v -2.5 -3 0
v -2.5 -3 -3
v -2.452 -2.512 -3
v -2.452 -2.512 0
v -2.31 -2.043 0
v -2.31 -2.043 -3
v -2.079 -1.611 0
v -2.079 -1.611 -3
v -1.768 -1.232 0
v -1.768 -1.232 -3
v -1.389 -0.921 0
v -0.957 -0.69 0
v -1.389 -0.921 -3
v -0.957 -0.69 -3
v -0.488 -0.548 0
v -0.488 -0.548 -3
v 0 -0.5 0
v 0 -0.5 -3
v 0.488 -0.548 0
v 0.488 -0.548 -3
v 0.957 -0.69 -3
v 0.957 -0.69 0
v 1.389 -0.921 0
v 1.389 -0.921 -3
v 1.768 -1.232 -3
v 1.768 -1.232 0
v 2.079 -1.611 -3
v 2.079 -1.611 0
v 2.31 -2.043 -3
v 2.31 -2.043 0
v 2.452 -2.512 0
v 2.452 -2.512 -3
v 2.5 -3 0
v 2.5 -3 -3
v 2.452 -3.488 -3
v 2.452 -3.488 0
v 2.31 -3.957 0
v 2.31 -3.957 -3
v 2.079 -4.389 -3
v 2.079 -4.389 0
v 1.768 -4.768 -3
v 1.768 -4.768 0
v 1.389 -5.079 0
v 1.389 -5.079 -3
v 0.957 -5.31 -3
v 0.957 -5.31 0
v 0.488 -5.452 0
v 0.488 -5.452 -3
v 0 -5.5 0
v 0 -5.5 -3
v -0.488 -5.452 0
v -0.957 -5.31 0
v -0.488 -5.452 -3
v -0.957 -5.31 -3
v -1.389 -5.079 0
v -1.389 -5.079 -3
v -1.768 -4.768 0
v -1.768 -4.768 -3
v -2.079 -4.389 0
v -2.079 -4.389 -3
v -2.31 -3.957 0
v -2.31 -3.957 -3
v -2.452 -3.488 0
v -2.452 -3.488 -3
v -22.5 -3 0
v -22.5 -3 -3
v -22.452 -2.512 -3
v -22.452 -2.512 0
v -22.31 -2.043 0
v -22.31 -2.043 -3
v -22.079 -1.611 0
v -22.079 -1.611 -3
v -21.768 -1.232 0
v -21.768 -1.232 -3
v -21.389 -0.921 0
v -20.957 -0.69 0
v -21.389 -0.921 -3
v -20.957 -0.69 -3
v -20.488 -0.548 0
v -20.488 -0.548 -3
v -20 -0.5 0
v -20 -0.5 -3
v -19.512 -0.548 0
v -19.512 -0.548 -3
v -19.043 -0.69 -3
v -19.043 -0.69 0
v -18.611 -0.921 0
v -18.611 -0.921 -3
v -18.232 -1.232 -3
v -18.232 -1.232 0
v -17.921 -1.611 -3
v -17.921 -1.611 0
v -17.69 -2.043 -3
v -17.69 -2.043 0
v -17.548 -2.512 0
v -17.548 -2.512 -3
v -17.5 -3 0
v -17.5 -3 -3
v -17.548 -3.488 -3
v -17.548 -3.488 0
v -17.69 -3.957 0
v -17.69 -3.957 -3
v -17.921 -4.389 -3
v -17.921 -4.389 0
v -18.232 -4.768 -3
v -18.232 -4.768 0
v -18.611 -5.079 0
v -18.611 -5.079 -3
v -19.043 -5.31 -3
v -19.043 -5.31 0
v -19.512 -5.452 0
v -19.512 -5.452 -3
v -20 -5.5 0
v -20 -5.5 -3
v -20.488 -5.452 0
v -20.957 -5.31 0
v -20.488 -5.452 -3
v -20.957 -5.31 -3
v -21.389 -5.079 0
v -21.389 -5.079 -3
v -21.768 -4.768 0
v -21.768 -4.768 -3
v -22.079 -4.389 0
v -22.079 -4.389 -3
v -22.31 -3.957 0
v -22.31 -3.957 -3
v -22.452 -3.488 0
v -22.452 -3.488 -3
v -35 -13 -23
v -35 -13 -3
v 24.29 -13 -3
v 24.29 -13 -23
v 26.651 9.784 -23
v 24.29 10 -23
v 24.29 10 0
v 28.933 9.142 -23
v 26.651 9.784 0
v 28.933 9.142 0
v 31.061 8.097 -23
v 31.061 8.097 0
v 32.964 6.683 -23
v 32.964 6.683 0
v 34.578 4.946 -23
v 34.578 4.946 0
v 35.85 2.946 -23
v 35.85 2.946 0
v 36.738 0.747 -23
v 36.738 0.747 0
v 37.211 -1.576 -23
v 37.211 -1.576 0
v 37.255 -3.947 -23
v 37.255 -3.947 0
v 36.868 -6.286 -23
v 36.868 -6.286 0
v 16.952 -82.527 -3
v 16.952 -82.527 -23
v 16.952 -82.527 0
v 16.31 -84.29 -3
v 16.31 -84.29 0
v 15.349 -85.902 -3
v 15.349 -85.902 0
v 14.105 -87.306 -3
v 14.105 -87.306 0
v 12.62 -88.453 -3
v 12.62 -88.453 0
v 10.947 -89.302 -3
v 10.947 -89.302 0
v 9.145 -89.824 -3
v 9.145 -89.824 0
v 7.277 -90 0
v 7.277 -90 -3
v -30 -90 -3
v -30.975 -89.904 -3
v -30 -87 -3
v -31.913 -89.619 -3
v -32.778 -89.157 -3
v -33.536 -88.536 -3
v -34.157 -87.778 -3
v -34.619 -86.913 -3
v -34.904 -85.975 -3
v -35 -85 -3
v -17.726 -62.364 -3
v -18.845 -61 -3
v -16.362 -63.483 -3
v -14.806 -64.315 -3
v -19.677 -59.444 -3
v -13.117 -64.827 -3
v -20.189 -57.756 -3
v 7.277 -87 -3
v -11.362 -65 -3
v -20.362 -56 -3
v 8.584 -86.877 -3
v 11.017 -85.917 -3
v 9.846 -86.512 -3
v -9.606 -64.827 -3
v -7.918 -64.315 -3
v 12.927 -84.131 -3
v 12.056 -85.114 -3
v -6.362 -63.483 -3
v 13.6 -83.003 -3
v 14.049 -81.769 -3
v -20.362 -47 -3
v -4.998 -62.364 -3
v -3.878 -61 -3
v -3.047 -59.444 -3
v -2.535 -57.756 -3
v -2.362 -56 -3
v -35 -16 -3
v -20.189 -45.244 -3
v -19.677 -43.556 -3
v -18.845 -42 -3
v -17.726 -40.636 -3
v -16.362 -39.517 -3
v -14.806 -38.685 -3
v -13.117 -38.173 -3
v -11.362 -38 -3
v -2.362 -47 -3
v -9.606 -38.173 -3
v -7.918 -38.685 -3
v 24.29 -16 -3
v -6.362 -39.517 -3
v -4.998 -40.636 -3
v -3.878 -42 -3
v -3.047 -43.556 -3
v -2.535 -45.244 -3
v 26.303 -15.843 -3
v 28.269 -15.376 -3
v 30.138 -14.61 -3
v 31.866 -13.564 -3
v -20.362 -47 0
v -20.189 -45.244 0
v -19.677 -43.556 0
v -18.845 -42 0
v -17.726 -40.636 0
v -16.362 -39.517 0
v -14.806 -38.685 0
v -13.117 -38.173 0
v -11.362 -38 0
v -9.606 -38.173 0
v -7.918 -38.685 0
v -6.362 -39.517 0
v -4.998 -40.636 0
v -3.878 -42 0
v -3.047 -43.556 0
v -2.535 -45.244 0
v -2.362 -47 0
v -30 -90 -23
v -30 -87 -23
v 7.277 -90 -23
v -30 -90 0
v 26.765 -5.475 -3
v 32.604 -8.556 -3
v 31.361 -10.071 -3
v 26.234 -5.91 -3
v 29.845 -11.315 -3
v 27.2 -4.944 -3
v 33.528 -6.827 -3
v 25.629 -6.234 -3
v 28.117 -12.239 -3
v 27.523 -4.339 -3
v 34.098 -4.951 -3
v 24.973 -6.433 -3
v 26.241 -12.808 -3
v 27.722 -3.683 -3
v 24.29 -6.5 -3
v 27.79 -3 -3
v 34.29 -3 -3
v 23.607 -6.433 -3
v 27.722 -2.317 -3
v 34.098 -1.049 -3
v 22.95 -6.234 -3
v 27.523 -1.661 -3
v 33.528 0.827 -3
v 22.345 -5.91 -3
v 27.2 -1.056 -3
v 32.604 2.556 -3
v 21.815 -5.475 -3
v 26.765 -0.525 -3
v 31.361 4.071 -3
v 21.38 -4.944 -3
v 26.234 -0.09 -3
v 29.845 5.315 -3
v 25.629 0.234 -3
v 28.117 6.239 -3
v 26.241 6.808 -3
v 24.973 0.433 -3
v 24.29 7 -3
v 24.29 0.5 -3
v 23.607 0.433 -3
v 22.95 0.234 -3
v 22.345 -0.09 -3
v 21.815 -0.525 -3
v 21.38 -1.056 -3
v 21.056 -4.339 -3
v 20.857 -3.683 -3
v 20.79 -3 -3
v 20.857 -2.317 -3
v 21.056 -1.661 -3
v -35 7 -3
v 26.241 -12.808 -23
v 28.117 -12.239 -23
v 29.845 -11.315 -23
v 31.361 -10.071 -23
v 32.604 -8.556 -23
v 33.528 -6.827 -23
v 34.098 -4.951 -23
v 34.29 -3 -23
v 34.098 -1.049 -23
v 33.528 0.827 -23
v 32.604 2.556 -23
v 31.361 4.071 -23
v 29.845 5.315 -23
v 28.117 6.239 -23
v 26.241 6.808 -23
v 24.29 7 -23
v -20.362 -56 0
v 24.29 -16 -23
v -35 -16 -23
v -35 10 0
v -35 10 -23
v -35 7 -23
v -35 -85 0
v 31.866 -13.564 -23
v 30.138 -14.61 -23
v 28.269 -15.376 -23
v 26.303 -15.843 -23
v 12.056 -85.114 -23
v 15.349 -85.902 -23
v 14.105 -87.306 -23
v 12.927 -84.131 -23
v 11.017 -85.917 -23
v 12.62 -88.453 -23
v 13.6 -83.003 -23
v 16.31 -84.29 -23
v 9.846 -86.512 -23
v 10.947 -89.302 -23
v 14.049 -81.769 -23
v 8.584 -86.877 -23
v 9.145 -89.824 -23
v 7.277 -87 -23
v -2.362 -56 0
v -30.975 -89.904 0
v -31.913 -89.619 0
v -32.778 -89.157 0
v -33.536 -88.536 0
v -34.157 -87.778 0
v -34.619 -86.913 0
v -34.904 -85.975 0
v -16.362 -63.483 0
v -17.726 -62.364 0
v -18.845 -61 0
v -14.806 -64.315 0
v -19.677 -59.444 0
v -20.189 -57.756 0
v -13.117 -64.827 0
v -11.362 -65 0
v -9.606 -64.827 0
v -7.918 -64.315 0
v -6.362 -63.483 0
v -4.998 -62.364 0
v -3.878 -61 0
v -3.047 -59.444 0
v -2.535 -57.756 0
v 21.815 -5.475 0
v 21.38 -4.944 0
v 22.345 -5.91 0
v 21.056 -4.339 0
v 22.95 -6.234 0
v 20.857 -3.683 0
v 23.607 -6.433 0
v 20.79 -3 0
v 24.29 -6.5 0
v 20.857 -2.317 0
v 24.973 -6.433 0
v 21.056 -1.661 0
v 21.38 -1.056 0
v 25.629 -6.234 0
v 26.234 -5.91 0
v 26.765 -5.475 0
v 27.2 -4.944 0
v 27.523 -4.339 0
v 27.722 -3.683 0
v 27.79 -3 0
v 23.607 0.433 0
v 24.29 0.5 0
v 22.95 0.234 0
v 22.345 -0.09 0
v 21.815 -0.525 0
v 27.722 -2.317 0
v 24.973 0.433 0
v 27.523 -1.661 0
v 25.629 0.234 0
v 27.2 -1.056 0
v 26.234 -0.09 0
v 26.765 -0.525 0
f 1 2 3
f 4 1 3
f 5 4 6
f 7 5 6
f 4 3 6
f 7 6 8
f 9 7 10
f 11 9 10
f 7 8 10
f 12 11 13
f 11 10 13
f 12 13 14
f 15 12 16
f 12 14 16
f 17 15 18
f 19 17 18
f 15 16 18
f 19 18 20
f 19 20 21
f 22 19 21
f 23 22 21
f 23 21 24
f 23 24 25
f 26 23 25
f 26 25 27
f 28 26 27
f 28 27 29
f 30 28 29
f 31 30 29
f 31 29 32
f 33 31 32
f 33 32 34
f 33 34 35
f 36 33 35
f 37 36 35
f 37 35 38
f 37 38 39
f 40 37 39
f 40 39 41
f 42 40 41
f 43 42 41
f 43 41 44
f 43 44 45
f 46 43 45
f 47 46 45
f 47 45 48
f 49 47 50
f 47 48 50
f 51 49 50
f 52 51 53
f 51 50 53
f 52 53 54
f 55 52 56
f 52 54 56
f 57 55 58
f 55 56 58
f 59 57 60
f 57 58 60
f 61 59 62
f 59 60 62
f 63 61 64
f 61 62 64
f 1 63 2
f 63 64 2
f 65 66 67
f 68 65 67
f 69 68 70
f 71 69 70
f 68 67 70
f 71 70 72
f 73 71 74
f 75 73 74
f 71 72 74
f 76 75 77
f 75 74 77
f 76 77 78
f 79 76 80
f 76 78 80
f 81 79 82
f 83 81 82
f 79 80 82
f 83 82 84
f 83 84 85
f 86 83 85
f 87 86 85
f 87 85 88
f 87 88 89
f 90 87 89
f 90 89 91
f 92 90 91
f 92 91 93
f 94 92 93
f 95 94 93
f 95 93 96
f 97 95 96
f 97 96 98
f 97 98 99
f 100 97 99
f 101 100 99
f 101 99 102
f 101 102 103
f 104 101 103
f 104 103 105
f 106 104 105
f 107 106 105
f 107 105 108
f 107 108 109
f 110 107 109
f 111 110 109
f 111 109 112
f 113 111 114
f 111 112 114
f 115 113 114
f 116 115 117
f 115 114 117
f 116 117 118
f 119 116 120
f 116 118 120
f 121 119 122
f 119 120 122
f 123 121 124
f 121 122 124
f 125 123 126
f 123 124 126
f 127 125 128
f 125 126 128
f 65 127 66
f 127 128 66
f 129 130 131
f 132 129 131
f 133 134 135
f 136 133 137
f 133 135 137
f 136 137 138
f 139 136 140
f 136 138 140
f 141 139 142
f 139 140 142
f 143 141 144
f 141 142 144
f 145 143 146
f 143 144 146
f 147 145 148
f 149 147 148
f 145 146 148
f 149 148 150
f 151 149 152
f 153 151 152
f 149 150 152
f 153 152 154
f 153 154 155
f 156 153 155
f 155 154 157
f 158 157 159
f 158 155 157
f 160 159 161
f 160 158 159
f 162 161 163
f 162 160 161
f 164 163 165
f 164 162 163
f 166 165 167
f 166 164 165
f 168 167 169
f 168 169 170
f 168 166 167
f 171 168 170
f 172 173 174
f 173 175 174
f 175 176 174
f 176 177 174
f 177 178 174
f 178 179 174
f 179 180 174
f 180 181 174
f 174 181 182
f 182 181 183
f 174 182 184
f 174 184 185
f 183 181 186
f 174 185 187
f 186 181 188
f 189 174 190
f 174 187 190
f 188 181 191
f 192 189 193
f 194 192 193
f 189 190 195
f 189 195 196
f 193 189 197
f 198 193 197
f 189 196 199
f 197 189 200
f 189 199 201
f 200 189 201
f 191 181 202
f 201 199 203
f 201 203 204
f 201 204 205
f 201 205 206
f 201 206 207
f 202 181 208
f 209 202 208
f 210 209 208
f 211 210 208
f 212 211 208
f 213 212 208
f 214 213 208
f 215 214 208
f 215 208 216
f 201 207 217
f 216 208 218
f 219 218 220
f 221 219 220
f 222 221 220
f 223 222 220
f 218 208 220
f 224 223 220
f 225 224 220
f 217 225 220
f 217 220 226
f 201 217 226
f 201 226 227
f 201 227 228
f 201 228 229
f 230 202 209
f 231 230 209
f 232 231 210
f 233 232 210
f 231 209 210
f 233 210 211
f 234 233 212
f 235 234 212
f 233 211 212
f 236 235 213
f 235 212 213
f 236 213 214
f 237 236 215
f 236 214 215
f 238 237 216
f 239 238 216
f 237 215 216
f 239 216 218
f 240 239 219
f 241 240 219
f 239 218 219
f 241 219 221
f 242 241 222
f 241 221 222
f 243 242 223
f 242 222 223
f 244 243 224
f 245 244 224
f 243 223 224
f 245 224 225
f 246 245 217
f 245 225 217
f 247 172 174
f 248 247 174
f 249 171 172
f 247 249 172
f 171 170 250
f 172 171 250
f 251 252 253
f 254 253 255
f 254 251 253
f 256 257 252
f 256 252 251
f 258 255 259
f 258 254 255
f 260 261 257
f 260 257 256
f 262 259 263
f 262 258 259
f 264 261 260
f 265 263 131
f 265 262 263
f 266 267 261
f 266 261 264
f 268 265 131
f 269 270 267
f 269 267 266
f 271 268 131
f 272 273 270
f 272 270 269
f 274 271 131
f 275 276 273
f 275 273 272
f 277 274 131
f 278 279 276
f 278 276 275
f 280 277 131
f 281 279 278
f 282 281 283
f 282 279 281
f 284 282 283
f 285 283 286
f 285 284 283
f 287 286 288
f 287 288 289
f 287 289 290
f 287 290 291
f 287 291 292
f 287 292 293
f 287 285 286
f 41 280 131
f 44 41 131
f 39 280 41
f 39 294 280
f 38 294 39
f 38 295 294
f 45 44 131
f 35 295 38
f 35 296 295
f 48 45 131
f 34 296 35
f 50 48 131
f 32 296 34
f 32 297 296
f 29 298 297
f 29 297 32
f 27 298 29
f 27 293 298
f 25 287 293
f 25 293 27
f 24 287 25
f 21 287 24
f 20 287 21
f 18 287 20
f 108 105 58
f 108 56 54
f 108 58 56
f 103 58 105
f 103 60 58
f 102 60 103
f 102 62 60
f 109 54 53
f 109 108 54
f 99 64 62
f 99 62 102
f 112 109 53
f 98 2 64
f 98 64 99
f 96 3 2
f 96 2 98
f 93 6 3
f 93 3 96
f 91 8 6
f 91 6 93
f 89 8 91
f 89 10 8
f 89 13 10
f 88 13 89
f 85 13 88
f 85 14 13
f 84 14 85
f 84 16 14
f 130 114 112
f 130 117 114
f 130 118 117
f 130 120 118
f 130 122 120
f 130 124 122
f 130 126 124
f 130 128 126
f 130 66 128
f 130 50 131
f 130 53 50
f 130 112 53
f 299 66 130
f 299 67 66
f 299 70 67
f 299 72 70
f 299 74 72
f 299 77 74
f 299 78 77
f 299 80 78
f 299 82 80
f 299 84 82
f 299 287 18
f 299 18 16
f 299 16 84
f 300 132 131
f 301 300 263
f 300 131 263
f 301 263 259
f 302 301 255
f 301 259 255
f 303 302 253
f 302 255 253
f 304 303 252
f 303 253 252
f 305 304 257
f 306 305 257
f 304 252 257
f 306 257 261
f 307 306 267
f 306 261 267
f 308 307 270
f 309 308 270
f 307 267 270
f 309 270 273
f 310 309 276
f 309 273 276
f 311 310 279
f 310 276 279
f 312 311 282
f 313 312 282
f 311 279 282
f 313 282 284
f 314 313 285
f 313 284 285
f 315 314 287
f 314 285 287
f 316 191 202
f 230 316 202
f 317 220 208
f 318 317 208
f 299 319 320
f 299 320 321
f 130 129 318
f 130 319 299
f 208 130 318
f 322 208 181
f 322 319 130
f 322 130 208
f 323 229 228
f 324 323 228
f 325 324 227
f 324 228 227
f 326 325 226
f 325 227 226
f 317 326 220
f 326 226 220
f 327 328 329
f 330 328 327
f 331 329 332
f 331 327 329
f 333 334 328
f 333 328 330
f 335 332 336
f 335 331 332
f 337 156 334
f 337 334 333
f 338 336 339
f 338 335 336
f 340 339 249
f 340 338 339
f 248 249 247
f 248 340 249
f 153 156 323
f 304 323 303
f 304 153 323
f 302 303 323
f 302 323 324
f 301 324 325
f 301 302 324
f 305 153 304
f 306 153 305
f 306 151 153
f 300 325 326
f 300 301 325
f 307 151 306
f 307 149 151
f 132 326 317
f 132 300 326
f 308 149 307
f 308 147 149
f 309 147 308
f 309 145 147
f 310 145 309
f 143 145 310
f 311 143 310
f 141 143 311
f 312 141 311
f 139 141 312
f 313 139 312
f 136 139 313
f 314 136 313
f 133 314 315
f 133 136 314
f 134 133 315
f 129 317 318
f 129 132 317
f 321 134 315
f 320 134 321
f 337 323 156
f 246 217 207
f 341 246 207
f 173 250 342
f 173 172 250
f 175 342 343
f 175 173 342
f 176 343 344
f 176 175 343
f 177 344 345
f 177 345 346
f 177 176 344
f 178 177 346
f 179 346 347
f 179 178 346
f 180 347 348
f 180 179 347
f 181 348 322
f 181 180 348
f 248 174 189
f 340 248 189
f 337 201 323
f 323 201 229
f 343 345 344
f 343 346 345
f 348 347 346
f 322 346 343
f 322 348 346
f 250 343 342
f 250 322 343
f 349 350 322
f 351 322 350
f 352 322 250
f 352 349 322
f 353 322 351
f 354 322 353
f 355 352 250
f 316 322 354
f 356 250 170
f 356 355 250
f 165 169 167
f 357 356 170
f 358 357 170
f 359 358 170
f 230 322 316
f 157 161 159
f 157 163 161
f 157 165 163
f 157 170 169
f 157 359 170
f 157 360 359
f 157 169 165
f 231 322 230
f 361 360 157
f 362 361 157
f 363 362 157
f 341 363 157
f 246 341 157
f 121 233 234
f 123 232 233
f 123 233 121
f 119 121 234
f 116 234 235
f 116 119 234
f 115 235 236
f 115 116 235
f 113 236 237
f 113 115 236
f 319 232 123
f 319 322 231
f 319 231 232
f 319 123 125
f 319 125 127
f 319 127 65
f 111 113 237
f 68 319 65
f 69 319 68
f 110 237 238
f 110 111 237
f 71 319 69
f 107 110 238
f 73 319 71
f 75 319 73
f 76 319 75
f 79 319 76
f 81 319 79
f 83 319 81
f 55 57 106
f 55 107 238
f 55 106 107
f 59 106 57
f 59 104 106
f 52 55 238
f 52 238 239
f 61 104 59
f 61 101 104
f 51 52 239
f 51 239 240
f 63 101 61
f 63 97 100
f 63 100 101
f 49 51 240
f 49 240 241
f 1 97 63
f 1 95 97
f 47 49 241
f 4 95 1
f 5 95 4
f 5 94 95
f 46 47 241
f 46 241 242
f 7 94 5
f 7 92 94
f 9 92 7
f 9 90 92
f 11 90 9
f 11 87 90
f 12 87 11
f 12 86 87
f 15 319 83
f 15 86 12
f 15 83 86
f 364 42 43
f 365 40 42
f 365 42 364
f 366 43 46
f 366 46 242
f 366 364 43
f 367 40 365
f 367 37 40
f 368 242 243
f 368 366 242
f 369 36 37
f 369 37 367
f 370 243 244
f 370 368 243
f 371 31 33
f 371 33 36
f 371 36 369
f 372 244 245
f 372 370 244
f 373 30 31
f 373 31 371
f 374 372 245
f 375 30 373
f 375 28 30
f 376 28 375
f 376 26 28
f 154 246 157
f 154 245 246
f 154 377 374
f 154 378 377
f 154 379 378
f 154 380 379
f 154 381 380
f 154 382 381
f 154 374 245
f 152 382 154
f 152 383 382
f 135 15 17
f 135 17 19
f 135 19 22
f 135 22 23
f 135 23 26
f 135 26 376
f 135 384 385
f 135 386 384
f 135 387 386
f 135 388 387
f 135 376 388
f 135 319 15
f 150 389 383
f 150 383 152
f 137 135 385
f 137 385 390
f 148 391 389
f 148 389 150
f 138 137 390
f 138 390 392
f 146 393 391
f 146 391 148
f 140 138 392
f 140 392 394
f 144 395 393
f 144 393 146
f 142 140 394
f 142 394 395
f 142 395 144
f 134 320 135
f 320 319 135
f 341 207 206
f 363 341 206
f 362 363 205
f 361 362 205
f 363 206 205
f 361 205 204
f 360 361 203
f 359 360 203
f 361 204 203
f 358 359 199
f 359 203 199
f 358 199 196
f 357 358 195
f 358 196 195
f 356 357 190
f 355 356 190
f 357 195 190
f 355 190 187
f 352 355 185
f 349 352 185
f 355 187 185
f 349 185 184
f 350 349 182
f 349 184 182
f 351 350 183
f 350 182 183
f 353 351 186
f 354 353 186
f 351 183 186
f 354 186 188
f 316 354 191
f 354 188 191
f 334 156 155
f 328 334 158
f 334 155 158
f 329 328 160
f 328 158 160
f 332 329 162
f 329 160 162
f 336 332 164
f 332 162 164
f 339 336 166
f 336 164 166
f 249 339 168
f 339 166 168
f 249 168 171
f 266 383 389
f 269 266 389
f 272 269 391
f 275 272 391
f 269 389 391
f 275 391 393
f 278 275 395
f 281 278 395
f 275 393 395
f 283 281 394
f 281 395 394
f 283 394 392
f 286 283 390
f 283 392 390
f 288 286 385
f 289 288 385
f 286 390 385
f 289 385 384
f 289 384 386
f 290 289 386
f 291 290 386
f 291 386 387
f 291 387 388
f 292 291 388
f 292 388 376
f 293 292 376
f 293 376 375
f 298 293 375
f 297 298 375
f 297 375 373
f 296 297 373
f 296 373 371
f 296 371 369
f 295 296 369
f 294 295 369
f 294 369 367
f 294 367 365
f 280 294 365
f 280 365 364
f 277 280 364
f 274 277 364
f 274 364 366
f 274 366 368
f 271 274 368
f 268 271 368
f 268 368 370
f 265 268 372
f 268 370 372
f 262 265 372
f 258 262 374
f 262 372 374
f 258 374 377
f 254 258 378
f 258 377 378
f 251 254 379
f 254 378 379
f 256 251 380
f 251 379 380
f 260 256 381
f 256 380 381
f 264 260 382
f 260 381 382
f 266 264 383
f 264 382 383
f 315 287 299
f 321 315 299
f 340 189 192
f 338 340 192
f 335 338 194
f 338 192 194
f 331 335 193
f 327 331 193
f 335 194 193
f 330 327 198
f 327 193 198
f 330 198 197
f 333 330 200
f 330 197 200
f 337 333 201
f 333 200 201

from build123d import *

# Parameters (mm, degrees)
BOSS_EXTRUDE1_DEPTH = 3
BOSS_EXTRUDE2_DEPTH = 20
SKETCH3_R           = 3.5
CUT_EXTRUDE1_DEPTH  = 20
BOSS_EXTRUDE3_DEPTH = 3
FILLET1_R           = 10
FILLET3_R           = 5
BOSS_EXTRUDE4_DEPTH = 20
CUT_EXTRUDE2_DEPTH  = 20
CUT_EXTRUDE4_DEPTH  = 20


with BuildPart() as part:
    # Sketch1 → Boss-Extrude1 (new body)
    with BuildSketch(Plane.XY):
        with BuildLine():
            Line((-35, 10), (24.289684969, 10))
            ThreePointArc((24.289684969, 10), (37.289684969, -3), (24.289684969, -16))
            Line((24.289684969, -16), (-35, -16))
            Line((-35, -16), (-35, 10))
        make_face()
    extrude(amount=-BOSS_EXTRUDE1_DEPTH)

    # Sketch2 → Boss-Extrude2 (add)
    with BuildSketch(Plane(origin=(0, 0, -3), x_dir=(-1, 0, 0), z_dir=(0, 0, -1))):
        with BuildLine():
            Line((-24.289684969, 7), (35, 7))
            Line((35, 7), (35, 10))
            Line((35, 10), (-24.289684969, 10))
            ThreePointArc((-24.289684969, 10), (-37.289684969, -3), (-24.289684969, -16))
            Line((-24.289684969, -16), (35, -16))
            Line((35, -16), (35, -13))
            Line((35, -13), (-24.289684969, -13))
            ThreePointArc((-24.289684969, -13), (-34.289684969, -3), (-24.289684969, 7))
        make_face()
    extrude(amount=BOSS_EXTRUDE2_DEPTH)

    # Sketch3 → Cut-Extrude1 (cut)
    with BuildSketch(Plane.XY):
        with Locations((24.289684969, -3)):
            Circle(SKETCH3_R)
    extrude(amount=-CUT_EXTRUDE1_DEPTH, mode=Mode.SUBTRACT)

    # Sketch4 → Boss-Extrude3 (add)
    with BuildSketch(Plane.XY):
        with BuildLine():
            Line((24.289684969, -16), (-35, -16))
            Line((-35, -16), (-35, -90))
            Line((-35, -90), (15, -90))
            Line((15, -90), (36.86764108, -6.285577584))
            ThreePointArc((36.86764108, -6.285577584), (32.235988871, -13.288646864), (24.289684969, -16))
        make_face()
    extrude(amount=-BOSS_EXTRUDE3_DEPTH)

    # Fillet1
    fillet1_edges = [part.edges().sort_by_distance(p)[0] for p in [
        (15, -90, -1.5),
    ]]
    fillet(fillet1_edges, radius=FILLET1_R)

    # Fillet3
    fillet3_edges = [part.edges().sort_by_distance(p)[0] for p in [
        (-35, -90, -1.5),
    ]]
    fillet(fillet3_edges, radius=FILLET3_R)

    # Sketch5 → Boss-Extrude4 (add)
    with BuildSketch(Plane(origin=(0, 0, -3), x_dir=(-1, 0, 0), z_dir=(0, 0, -1))):
        with BuildLine():
            Line((-14.049374385, -81.769157161), (-31.865646811, -13.564317402))
            ThreePointArc((-31.865646811, -13.564317402), (-35.003699882, -10.362736207), (-36.86764108, -6.285577584))
            Line((-36.86764108, -6.285577584), (-16.951979641, -82.527367373))
            ThreePointArc((-16.951979641, -82.527367373), (-13.389170249, -87.914343742), (-7.276628786, -90))
            Line((-7.276628786, -90), (30, -90))
            Line((30, -90), (30, -87))
            Line((30, -87), (-7.276628786, -87))
            ThreePointArc((-7.276628786, -87), (-11.55540781, -85.540040619), (-14.049374385, -81.769157161))
        make_face()
    extrude(amount=BOSS_EXTRUDE4_DEPTH)

    # Sketch7 → Cut-Extrude2 (cut)
    with BuildSketch(Plane(origin=(0, 0, -3), x_dir=(-1, 0, 0), z_dir=(0, 0, -1))):
        with BuildLine():
            ThreePointArc((-2.5, -3), (0, -5.5), (2.5, -3))
            Line((2.5, -3), (-2.5, -3))
        make_face()
        with BuildLine():
            Line((-2.5, -3), (2.5, -3))
            ThreePointArc((2.5, -3), (0, -0.5), (-2.5, -3))
        make_face()
        with BuildLine():
            ThreePointArc((17.5, -3), (20, -5.5), (22.5, -3))
            Line((22.5, -3), (17.5, -3))
        make_face()
        with BuildLine():
            Line((17.5, -3), (22.5, -3))
            ThreePointArc((22.5, -3), (20, -0.5), (17.5, -3))
        make_face()
    extrude(amount=-CUT_EXTRUDE2_DEPTH, mode=Mode.SUBTRACT)

    # Sketch6 → Cut-Extrude4 (cut)
    with BuildSketch(Plane(origin=(0, 0, -3), x_dir=(-1, 0, 0), z_dir=(0, 0, -1))):
        with BuildLine():
            Line((20.361685607, -56), (20.361685607, -47))
            ThreePointArc((20.361685607, -47), (11.361685607, -38), (2.361685607, -47))
            Line((2.361685607, -47), (2.361685607, -56))
            ThreePointArc((2.361685607, -56), (11.361685607, -65), (20.361685607, -56))
        make_face()
    extrude(amount=-CUT_EXTRUDE4_DEPTH, mode=Mode.SUBTRACT)


solid = part.part
